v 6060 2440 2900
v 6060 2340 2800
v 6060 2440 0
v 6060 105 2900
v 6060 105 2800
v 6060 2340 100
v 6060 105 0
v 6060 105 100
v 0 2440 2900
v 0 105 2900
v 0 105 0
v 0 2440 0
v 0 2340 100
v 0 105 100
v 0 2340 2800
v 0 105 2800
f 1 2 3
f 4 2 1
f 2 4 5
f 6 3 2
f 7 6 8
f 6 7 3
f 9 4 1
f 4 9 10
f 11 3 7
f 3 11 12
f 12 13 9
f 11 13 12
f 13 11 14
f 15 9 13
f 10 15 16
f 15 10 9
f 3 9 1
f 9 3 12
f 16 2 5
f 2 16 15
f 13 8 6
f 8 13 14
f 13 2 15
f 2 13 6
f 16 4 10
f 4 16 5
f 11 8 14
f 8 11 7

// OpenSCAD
difference(){
    cube([6060, 2440, 2900]);
    translate([-50, 100, 100]) cube([6160, 2240, 2700]);
    //origin-side side wall
    translate([-50, -5, -25]) cube([6160, 110, 2950]);
}
